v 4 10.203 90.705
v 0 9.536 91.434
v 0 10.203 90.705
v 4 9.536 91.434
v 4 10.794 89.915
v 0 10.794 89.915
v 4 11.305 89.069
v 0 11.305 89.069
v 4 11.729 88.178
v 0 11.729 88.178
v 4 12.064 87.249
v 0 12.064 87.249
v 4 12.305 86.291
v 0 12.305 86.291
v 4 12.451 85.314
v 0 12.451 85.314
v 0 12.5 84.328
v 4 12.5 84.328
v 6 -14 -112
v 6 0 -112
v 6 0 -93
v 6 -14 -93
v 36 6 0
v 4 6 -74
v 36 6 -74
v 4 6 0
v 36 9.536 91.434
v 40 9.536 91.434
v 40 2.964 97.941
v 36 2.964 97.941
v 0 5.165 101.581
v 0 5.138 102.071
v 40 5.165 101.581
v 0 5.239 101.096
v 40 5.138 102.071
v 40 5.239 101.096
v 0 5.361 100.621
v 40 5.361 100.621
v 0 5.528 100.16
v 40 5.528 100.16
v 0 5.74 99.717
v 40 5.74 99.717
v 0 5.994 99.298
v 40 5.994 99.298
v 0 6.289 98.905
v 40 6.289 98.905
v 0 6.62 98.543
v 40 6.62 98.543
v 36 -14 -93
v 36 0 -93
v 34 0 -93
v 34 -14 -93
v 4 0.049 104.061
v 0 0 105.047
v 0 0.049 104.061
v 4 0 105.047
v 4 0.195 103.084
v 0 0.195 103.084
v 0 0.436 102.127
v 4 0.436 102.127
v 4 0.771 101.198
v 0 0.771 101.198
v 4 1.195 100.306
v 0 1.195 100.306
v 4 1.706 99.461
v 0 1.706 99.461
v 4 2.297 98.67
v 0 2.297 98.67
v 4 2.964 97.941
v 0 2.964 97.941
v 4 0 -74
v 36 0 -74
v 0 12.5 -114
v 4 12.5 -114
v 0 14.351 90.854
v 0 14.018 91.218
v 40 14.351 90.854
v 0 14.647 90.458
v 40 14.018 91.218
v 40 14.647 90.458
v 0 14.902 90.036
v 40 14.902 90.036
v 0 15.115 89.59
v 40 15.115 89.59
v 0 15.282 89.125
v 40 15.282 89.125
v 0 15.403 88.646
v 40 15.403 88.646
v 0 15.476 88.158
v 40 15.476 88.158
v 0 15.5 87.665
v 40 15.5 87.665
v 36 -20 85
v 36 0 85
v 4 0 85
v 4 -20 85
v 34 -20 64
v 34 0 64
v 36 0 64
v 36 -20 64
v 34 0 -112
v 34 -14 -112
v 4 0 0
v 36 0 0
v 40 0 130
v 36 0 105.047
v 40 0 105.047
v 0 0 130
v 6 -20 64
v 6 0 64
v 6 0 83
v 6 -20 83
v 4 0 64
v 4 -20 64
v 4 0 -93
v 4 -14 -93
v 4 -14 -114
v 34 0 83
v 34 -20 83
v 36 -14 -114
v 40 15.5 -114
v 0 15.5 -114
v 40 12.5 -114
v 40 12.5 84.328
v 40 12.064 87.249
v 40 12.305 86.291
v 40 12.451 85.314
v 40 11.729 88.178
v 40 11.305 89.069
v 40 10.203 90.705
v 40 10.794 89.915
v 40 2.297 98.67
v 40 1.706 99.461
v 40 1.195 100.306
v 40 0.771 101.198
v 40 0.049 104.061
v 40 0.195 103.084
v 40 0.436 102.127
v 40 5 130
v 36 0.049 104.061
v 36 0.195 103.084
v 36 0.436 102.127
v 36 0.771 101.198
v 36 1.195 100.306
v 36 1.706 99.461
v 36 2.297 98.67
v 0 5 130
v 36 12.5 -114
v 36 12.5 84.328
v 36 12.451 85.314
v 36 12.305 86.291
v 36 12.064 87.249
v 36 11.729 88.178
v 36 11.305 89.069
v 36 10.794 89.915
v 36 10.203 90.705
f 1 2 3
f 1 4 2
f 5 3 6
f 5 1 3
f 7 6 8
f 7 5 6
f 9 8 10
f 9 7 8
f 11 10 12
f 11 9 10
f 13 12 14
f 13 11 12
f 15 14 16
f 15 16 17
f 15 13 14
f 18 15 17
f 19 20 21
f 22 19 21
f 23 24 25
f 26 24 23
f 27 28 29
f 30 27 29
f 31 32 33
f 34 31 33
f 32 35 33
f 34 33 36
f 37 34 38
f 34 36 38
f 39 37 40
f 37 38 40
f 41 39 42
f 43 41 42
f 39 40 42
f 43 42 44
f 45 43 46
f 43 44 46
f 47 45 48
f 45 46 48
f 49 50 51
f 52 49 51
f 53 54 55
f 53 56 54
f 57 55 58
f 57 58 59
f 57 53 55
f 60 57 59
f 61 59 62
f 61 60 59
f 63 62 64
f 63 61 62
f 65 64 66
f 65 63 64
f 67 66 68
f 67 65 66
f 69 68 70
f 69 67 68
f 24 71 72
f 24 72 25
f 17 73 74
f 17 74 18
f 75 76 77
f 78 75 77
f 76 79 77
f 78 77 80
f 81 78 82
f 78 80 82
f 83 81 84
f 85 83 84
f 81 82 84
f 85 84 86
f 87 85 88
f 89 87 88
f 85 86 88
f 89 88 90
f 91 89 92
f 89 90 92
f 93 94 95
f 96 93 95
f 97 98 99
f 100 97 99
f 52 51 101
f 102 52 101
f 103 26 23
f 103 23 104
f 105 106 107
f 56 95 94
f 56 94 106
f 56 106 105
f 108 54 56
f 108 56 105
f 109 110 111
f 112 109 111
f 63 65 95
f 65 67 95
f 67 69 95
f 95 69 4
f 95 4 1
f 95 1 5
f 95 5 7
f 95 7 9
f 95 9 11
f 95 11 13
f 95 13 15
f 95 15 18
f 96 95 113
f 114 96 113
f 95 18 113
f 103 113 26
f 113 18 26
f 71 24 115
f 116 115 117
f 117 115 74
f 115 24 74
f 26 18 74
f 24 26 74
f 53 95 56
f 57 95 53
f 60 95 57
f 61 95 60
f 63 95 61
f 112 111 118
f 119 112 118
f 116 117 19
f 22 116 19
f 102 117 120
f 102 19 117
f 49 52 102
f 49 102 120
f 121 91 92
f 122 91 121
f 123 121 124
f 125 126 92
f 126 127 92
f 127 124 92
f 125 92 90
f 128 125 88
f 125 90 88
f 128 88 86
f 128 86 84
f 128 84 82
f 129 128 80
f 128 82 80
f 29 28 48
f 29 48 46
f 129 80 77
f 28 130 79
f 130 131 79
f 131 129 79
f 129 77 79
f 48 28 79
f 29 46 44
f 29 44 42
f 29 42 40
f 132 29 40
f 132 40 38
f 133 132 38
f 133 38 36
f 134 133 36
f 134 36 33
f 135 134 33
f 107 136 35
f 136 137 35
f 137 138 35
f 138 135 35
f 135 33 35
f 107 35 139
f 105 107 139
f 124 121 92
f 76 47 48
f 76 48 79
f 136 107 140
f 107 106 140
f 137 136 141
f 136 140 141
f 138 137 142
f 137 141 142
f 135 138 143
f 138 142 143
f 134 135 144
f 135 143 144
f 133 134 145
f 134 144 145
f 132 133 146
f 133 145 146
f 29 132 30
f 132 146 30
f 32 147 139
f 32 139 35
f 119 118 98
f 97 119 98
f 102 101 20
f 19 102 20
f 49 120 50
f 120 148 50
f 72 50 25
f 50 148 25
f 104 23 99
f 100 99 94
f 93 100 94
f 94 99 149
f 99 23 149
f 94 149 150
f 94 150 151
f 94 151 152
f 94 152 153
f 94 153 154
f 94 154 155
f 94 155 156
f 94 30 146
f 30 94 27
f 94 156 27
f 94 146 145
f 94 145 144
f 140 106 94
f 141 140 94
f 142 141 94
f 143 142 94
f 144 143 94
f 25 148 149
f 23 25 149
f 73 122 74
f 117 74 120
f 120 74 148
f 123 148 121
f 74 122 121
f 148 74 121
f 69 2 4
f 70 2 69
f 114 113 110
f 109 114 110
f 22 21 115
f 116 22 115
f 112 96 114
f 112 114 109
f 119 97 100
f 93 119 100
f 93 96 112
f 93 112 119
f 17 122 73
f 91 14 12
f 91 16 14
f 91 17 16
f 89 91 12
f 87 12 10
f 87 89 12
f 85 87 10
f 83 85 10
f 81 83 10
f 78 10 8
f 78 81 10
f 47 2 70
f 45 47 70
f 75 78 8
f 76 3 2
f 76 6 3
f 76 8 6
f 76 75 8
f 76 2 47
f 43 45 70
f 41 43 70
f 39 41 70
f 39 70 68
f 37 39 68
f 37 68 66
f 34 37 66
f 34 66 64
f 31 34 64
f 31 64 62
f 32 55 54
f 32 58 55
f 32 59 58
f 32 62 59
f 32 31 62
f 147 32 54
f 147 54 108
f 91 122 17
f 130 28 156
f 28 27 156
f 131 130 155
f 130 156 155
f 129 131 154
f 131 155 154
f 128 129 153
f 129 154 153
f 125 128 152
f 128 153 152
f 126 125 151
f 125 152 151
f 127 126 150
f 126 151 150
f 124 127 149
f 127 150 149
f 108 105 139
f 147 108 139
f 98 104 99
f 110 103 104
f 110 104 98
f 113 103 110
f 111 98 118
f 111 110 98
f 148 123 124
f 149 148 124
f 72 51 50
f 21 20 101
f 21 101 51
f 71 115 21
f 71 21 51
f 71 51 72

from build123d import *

# Parameters (mm, degrees)
BOSS_EXTRUDE1_DEPTH = 40
CUT_EXTRUDE2_DEPTH  = 4
FILLET6_R           = 10
FILLET7_R           = 5
BOSS_EXTRUDE2_DEPTH = 20
BOSS_EXTRUDE3_DEPTH = 14


with BuildPart() as part:
    # Sketch1 → Boss-Extrude1 (new body)
    with BuildSketch(Plane(origin=(0, 0, 0), x_dir=(0, 0, -1), z_dir=(1, 0, 0))):
        Polygon((0, 0), (-130, 0), (-130, 5), (-100.000366453, 5.148280317), (-89.750475128, 15.5), (114, 15.5), (114, 0), (74, 0), (74, 6), (0, 6), align=None)
    extrude(amount=BOSS_EXTRUDE1_DEPTH)

    # Sketch6 → Cut-Extrude2 (cut)
    with BuildSketch(Plane(origin=(40, 0, 0), x_dir=(0, 0, -1), z_dir=(1, 0, 0))):
        Polygon((-100.876178749, 0), (114, 0), (114, 12.5), (-88.499139427, 12.5), align=None)
    cut_extrude2 = extrude(amount=-CUT_EXTRUDE2_DEPTH, mode=Mode.SUBTRACT)

    # Mirror3: Cut-Extrude2 across plane
    add(cut_extrude2.mirror(Plane(origin=(20, 0, 0), x_dir=(0, 0, 1), z_dir=(1, 0, 0))), mode=Mode.SUBTRACT)

    # Fillet6
    fillet6_edges = [part.edges().sort_by_distance(p)[0] for p in [
        (38, 0, 100.876178749),
        (38, 12.5, 88.499139427),
        (2, 0, 100.876178749),
        (2, 12.5, 88.499139427),
    ]]
    fillet(fillet6_edges, radius=FILLET6_R)

    # Fillet7
    fillet7_edges = [part.edges().sort_by_distance(p)[0] for p in [
        (20, 5.148280317, 100.000366453),
        (20, 15.5, 89.750475128),
    ]]
    fillet(fillet7_edges, radius=FILLET7_R)

    # Sketch7 → Boss-Extrude2 (add)
    with BuildSketch(Plane.XZ):
        Polygon((36, 85), (4, 85), (4, 64), (6, 64), (6, 83), (34, 83), (34, 64), (36, 64), align=None)
    extrude(amount=BOSS_EXTRUDE2_DEPTH)

    # Sketch9 → Boss-Extrude3 (add)
    with BuildSketch(Plane.XZ):
        Polygon((4, -114), (36, -114), (36, -93), (34, -93), (34, -112), (6, -112), (6, -93), (4, -93), align=None)
    extrude(amount=BOSS_EXTRUDE3_DEPTH)


solid = part.part
